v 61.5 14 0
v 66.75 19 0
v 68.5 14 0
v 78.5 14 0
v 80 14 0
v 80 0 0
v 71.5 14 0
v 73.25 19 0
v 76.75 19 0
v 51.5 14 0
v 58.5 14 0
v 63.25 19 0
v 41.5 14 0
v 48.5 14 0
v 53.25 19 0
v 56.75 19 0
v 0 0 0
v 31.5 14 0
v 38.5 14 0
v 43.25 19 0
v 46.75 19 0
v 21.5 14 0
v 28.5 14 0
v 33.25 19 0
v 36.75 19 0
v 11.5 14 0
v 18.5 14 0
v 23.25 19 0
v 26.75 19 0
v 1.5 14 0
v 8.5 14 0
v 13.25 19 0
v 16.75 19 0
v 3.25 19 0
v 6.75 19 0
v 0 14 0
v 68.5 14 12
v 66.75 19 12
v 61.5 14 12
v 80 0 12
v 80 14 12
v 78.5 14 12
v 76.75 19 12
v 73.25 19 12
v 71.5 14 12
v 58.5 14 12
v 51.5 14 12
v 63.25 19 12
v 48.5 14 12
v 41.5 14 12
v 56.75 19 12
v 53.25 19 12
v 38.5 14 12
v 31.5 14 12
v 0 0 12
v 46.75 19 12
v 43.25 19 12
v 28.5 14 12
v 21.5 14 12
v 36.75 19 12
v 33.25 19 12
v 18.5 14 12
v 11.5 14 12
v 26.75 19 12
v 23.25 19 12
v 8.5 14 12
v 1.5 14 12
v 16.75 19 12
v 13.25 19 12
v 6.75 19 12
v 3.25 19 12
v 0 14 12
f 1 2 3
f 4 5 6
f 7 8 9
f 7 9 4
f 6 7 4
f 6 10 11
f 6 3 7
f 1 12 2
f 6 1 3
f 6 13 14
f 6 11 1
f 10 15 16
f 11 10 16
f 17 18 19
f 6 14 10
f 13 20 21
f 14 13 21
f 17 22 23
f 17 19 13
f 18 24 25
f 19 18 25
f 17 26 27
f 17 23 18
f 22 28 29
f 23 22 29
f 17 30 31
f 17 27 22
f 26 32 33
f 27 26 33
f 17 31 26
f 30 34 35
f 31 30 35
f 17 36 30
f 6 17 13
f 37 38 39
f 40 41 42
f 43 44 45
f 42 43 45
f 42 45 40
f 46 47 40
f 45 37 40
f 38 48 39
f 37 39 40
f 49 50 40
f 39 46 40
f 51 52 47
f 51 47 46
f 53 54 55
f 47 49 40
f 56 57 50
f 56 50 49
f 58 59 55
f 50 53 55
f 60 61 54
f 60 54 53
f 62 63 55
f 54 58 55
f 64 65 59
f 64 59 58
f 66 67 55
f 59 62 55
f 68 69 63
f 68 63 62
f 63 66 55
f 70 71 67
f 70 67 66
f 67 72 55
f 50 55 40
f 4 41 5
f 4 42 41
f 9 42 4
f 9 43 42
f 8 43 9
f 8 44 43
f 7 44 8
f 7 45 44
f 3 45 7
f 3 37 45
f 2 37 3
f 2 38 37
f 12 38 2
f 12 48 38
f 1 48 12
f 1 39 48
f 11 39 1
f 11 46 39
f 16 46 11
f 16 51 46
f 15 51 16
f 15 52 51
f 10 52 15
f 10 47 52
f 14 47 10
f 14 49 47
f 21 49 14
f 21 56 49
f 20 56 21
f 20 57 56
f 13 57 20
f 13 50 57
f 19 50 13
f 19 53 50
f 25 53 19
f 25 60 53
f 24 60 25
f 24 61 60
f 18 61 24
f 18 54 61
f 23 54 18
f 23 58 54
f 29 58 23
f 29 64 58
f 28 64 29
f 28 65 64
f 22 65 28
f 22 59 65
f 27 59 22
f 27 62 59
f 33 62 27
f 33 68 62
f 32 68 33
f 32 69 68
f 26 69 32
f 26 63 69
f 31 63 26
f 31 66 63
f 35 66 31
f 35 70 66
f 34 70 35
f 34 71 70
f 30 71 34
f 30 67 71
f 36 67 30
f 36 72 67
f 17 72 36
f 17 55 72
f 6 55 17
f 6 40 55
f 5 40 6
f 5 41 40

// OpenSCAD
$fn = 32;

// ----------------------------------------------------------------------
// Gear rack: 8 teeth, pitch 10 mm
// ----------------------------------------------------------------------

// --- parameters (mm) ---
teeth = 8;                // number of teeth
pitch = 10;               // tooth pitch, X
root_w = 7;               // tooth width at the root
tip_w = 3.5;              // tooth width at the tip
base_h = 14;              // rack body height, Y
tooth_h = 5;              // tooth height above the body
plate_t = 12;             // rack width, Z (extrusion height)
fit_tol = 0.02;           // declared fit tolerance (prompt contract)
free_tol = 0.2;           // declared free tolerance (prompt contract)

rack_l = teeth * pitch;  // overall length
total_h = base_h + tooth_h;  // overall height

profile = [[0, 0], [80, 0], [80, 14], [78.5, 14], [76.75, 19], [73.25, 19], [71.5, 14], [68.5, 14], [66.75, 19], [63.25, 19], [61.5, 14], [58.5, 14], [56.75, 19], [53.25, 19], [51.5, 14], [48.5, 14], [46.75, 19], [43.25, 19], [41.5, 14], [38.5, 14], [36.75, 19], [33.25, 19], [31.5, 14], [28.5, 14], [26.75, 19], [23.25, 19], [21.5, 14], [18.5, 14], [16.75, 19], [13.25, 19], [11.5, 14], [8.5, 14], [6.75, 19], [3.25, 19], [1.5, 14], [0, 14]];  // primary outline, 36 points, counter clockwise

// --- the one profile operation ---
linear_extrude(height = plate_t) polygon(points = profile);
